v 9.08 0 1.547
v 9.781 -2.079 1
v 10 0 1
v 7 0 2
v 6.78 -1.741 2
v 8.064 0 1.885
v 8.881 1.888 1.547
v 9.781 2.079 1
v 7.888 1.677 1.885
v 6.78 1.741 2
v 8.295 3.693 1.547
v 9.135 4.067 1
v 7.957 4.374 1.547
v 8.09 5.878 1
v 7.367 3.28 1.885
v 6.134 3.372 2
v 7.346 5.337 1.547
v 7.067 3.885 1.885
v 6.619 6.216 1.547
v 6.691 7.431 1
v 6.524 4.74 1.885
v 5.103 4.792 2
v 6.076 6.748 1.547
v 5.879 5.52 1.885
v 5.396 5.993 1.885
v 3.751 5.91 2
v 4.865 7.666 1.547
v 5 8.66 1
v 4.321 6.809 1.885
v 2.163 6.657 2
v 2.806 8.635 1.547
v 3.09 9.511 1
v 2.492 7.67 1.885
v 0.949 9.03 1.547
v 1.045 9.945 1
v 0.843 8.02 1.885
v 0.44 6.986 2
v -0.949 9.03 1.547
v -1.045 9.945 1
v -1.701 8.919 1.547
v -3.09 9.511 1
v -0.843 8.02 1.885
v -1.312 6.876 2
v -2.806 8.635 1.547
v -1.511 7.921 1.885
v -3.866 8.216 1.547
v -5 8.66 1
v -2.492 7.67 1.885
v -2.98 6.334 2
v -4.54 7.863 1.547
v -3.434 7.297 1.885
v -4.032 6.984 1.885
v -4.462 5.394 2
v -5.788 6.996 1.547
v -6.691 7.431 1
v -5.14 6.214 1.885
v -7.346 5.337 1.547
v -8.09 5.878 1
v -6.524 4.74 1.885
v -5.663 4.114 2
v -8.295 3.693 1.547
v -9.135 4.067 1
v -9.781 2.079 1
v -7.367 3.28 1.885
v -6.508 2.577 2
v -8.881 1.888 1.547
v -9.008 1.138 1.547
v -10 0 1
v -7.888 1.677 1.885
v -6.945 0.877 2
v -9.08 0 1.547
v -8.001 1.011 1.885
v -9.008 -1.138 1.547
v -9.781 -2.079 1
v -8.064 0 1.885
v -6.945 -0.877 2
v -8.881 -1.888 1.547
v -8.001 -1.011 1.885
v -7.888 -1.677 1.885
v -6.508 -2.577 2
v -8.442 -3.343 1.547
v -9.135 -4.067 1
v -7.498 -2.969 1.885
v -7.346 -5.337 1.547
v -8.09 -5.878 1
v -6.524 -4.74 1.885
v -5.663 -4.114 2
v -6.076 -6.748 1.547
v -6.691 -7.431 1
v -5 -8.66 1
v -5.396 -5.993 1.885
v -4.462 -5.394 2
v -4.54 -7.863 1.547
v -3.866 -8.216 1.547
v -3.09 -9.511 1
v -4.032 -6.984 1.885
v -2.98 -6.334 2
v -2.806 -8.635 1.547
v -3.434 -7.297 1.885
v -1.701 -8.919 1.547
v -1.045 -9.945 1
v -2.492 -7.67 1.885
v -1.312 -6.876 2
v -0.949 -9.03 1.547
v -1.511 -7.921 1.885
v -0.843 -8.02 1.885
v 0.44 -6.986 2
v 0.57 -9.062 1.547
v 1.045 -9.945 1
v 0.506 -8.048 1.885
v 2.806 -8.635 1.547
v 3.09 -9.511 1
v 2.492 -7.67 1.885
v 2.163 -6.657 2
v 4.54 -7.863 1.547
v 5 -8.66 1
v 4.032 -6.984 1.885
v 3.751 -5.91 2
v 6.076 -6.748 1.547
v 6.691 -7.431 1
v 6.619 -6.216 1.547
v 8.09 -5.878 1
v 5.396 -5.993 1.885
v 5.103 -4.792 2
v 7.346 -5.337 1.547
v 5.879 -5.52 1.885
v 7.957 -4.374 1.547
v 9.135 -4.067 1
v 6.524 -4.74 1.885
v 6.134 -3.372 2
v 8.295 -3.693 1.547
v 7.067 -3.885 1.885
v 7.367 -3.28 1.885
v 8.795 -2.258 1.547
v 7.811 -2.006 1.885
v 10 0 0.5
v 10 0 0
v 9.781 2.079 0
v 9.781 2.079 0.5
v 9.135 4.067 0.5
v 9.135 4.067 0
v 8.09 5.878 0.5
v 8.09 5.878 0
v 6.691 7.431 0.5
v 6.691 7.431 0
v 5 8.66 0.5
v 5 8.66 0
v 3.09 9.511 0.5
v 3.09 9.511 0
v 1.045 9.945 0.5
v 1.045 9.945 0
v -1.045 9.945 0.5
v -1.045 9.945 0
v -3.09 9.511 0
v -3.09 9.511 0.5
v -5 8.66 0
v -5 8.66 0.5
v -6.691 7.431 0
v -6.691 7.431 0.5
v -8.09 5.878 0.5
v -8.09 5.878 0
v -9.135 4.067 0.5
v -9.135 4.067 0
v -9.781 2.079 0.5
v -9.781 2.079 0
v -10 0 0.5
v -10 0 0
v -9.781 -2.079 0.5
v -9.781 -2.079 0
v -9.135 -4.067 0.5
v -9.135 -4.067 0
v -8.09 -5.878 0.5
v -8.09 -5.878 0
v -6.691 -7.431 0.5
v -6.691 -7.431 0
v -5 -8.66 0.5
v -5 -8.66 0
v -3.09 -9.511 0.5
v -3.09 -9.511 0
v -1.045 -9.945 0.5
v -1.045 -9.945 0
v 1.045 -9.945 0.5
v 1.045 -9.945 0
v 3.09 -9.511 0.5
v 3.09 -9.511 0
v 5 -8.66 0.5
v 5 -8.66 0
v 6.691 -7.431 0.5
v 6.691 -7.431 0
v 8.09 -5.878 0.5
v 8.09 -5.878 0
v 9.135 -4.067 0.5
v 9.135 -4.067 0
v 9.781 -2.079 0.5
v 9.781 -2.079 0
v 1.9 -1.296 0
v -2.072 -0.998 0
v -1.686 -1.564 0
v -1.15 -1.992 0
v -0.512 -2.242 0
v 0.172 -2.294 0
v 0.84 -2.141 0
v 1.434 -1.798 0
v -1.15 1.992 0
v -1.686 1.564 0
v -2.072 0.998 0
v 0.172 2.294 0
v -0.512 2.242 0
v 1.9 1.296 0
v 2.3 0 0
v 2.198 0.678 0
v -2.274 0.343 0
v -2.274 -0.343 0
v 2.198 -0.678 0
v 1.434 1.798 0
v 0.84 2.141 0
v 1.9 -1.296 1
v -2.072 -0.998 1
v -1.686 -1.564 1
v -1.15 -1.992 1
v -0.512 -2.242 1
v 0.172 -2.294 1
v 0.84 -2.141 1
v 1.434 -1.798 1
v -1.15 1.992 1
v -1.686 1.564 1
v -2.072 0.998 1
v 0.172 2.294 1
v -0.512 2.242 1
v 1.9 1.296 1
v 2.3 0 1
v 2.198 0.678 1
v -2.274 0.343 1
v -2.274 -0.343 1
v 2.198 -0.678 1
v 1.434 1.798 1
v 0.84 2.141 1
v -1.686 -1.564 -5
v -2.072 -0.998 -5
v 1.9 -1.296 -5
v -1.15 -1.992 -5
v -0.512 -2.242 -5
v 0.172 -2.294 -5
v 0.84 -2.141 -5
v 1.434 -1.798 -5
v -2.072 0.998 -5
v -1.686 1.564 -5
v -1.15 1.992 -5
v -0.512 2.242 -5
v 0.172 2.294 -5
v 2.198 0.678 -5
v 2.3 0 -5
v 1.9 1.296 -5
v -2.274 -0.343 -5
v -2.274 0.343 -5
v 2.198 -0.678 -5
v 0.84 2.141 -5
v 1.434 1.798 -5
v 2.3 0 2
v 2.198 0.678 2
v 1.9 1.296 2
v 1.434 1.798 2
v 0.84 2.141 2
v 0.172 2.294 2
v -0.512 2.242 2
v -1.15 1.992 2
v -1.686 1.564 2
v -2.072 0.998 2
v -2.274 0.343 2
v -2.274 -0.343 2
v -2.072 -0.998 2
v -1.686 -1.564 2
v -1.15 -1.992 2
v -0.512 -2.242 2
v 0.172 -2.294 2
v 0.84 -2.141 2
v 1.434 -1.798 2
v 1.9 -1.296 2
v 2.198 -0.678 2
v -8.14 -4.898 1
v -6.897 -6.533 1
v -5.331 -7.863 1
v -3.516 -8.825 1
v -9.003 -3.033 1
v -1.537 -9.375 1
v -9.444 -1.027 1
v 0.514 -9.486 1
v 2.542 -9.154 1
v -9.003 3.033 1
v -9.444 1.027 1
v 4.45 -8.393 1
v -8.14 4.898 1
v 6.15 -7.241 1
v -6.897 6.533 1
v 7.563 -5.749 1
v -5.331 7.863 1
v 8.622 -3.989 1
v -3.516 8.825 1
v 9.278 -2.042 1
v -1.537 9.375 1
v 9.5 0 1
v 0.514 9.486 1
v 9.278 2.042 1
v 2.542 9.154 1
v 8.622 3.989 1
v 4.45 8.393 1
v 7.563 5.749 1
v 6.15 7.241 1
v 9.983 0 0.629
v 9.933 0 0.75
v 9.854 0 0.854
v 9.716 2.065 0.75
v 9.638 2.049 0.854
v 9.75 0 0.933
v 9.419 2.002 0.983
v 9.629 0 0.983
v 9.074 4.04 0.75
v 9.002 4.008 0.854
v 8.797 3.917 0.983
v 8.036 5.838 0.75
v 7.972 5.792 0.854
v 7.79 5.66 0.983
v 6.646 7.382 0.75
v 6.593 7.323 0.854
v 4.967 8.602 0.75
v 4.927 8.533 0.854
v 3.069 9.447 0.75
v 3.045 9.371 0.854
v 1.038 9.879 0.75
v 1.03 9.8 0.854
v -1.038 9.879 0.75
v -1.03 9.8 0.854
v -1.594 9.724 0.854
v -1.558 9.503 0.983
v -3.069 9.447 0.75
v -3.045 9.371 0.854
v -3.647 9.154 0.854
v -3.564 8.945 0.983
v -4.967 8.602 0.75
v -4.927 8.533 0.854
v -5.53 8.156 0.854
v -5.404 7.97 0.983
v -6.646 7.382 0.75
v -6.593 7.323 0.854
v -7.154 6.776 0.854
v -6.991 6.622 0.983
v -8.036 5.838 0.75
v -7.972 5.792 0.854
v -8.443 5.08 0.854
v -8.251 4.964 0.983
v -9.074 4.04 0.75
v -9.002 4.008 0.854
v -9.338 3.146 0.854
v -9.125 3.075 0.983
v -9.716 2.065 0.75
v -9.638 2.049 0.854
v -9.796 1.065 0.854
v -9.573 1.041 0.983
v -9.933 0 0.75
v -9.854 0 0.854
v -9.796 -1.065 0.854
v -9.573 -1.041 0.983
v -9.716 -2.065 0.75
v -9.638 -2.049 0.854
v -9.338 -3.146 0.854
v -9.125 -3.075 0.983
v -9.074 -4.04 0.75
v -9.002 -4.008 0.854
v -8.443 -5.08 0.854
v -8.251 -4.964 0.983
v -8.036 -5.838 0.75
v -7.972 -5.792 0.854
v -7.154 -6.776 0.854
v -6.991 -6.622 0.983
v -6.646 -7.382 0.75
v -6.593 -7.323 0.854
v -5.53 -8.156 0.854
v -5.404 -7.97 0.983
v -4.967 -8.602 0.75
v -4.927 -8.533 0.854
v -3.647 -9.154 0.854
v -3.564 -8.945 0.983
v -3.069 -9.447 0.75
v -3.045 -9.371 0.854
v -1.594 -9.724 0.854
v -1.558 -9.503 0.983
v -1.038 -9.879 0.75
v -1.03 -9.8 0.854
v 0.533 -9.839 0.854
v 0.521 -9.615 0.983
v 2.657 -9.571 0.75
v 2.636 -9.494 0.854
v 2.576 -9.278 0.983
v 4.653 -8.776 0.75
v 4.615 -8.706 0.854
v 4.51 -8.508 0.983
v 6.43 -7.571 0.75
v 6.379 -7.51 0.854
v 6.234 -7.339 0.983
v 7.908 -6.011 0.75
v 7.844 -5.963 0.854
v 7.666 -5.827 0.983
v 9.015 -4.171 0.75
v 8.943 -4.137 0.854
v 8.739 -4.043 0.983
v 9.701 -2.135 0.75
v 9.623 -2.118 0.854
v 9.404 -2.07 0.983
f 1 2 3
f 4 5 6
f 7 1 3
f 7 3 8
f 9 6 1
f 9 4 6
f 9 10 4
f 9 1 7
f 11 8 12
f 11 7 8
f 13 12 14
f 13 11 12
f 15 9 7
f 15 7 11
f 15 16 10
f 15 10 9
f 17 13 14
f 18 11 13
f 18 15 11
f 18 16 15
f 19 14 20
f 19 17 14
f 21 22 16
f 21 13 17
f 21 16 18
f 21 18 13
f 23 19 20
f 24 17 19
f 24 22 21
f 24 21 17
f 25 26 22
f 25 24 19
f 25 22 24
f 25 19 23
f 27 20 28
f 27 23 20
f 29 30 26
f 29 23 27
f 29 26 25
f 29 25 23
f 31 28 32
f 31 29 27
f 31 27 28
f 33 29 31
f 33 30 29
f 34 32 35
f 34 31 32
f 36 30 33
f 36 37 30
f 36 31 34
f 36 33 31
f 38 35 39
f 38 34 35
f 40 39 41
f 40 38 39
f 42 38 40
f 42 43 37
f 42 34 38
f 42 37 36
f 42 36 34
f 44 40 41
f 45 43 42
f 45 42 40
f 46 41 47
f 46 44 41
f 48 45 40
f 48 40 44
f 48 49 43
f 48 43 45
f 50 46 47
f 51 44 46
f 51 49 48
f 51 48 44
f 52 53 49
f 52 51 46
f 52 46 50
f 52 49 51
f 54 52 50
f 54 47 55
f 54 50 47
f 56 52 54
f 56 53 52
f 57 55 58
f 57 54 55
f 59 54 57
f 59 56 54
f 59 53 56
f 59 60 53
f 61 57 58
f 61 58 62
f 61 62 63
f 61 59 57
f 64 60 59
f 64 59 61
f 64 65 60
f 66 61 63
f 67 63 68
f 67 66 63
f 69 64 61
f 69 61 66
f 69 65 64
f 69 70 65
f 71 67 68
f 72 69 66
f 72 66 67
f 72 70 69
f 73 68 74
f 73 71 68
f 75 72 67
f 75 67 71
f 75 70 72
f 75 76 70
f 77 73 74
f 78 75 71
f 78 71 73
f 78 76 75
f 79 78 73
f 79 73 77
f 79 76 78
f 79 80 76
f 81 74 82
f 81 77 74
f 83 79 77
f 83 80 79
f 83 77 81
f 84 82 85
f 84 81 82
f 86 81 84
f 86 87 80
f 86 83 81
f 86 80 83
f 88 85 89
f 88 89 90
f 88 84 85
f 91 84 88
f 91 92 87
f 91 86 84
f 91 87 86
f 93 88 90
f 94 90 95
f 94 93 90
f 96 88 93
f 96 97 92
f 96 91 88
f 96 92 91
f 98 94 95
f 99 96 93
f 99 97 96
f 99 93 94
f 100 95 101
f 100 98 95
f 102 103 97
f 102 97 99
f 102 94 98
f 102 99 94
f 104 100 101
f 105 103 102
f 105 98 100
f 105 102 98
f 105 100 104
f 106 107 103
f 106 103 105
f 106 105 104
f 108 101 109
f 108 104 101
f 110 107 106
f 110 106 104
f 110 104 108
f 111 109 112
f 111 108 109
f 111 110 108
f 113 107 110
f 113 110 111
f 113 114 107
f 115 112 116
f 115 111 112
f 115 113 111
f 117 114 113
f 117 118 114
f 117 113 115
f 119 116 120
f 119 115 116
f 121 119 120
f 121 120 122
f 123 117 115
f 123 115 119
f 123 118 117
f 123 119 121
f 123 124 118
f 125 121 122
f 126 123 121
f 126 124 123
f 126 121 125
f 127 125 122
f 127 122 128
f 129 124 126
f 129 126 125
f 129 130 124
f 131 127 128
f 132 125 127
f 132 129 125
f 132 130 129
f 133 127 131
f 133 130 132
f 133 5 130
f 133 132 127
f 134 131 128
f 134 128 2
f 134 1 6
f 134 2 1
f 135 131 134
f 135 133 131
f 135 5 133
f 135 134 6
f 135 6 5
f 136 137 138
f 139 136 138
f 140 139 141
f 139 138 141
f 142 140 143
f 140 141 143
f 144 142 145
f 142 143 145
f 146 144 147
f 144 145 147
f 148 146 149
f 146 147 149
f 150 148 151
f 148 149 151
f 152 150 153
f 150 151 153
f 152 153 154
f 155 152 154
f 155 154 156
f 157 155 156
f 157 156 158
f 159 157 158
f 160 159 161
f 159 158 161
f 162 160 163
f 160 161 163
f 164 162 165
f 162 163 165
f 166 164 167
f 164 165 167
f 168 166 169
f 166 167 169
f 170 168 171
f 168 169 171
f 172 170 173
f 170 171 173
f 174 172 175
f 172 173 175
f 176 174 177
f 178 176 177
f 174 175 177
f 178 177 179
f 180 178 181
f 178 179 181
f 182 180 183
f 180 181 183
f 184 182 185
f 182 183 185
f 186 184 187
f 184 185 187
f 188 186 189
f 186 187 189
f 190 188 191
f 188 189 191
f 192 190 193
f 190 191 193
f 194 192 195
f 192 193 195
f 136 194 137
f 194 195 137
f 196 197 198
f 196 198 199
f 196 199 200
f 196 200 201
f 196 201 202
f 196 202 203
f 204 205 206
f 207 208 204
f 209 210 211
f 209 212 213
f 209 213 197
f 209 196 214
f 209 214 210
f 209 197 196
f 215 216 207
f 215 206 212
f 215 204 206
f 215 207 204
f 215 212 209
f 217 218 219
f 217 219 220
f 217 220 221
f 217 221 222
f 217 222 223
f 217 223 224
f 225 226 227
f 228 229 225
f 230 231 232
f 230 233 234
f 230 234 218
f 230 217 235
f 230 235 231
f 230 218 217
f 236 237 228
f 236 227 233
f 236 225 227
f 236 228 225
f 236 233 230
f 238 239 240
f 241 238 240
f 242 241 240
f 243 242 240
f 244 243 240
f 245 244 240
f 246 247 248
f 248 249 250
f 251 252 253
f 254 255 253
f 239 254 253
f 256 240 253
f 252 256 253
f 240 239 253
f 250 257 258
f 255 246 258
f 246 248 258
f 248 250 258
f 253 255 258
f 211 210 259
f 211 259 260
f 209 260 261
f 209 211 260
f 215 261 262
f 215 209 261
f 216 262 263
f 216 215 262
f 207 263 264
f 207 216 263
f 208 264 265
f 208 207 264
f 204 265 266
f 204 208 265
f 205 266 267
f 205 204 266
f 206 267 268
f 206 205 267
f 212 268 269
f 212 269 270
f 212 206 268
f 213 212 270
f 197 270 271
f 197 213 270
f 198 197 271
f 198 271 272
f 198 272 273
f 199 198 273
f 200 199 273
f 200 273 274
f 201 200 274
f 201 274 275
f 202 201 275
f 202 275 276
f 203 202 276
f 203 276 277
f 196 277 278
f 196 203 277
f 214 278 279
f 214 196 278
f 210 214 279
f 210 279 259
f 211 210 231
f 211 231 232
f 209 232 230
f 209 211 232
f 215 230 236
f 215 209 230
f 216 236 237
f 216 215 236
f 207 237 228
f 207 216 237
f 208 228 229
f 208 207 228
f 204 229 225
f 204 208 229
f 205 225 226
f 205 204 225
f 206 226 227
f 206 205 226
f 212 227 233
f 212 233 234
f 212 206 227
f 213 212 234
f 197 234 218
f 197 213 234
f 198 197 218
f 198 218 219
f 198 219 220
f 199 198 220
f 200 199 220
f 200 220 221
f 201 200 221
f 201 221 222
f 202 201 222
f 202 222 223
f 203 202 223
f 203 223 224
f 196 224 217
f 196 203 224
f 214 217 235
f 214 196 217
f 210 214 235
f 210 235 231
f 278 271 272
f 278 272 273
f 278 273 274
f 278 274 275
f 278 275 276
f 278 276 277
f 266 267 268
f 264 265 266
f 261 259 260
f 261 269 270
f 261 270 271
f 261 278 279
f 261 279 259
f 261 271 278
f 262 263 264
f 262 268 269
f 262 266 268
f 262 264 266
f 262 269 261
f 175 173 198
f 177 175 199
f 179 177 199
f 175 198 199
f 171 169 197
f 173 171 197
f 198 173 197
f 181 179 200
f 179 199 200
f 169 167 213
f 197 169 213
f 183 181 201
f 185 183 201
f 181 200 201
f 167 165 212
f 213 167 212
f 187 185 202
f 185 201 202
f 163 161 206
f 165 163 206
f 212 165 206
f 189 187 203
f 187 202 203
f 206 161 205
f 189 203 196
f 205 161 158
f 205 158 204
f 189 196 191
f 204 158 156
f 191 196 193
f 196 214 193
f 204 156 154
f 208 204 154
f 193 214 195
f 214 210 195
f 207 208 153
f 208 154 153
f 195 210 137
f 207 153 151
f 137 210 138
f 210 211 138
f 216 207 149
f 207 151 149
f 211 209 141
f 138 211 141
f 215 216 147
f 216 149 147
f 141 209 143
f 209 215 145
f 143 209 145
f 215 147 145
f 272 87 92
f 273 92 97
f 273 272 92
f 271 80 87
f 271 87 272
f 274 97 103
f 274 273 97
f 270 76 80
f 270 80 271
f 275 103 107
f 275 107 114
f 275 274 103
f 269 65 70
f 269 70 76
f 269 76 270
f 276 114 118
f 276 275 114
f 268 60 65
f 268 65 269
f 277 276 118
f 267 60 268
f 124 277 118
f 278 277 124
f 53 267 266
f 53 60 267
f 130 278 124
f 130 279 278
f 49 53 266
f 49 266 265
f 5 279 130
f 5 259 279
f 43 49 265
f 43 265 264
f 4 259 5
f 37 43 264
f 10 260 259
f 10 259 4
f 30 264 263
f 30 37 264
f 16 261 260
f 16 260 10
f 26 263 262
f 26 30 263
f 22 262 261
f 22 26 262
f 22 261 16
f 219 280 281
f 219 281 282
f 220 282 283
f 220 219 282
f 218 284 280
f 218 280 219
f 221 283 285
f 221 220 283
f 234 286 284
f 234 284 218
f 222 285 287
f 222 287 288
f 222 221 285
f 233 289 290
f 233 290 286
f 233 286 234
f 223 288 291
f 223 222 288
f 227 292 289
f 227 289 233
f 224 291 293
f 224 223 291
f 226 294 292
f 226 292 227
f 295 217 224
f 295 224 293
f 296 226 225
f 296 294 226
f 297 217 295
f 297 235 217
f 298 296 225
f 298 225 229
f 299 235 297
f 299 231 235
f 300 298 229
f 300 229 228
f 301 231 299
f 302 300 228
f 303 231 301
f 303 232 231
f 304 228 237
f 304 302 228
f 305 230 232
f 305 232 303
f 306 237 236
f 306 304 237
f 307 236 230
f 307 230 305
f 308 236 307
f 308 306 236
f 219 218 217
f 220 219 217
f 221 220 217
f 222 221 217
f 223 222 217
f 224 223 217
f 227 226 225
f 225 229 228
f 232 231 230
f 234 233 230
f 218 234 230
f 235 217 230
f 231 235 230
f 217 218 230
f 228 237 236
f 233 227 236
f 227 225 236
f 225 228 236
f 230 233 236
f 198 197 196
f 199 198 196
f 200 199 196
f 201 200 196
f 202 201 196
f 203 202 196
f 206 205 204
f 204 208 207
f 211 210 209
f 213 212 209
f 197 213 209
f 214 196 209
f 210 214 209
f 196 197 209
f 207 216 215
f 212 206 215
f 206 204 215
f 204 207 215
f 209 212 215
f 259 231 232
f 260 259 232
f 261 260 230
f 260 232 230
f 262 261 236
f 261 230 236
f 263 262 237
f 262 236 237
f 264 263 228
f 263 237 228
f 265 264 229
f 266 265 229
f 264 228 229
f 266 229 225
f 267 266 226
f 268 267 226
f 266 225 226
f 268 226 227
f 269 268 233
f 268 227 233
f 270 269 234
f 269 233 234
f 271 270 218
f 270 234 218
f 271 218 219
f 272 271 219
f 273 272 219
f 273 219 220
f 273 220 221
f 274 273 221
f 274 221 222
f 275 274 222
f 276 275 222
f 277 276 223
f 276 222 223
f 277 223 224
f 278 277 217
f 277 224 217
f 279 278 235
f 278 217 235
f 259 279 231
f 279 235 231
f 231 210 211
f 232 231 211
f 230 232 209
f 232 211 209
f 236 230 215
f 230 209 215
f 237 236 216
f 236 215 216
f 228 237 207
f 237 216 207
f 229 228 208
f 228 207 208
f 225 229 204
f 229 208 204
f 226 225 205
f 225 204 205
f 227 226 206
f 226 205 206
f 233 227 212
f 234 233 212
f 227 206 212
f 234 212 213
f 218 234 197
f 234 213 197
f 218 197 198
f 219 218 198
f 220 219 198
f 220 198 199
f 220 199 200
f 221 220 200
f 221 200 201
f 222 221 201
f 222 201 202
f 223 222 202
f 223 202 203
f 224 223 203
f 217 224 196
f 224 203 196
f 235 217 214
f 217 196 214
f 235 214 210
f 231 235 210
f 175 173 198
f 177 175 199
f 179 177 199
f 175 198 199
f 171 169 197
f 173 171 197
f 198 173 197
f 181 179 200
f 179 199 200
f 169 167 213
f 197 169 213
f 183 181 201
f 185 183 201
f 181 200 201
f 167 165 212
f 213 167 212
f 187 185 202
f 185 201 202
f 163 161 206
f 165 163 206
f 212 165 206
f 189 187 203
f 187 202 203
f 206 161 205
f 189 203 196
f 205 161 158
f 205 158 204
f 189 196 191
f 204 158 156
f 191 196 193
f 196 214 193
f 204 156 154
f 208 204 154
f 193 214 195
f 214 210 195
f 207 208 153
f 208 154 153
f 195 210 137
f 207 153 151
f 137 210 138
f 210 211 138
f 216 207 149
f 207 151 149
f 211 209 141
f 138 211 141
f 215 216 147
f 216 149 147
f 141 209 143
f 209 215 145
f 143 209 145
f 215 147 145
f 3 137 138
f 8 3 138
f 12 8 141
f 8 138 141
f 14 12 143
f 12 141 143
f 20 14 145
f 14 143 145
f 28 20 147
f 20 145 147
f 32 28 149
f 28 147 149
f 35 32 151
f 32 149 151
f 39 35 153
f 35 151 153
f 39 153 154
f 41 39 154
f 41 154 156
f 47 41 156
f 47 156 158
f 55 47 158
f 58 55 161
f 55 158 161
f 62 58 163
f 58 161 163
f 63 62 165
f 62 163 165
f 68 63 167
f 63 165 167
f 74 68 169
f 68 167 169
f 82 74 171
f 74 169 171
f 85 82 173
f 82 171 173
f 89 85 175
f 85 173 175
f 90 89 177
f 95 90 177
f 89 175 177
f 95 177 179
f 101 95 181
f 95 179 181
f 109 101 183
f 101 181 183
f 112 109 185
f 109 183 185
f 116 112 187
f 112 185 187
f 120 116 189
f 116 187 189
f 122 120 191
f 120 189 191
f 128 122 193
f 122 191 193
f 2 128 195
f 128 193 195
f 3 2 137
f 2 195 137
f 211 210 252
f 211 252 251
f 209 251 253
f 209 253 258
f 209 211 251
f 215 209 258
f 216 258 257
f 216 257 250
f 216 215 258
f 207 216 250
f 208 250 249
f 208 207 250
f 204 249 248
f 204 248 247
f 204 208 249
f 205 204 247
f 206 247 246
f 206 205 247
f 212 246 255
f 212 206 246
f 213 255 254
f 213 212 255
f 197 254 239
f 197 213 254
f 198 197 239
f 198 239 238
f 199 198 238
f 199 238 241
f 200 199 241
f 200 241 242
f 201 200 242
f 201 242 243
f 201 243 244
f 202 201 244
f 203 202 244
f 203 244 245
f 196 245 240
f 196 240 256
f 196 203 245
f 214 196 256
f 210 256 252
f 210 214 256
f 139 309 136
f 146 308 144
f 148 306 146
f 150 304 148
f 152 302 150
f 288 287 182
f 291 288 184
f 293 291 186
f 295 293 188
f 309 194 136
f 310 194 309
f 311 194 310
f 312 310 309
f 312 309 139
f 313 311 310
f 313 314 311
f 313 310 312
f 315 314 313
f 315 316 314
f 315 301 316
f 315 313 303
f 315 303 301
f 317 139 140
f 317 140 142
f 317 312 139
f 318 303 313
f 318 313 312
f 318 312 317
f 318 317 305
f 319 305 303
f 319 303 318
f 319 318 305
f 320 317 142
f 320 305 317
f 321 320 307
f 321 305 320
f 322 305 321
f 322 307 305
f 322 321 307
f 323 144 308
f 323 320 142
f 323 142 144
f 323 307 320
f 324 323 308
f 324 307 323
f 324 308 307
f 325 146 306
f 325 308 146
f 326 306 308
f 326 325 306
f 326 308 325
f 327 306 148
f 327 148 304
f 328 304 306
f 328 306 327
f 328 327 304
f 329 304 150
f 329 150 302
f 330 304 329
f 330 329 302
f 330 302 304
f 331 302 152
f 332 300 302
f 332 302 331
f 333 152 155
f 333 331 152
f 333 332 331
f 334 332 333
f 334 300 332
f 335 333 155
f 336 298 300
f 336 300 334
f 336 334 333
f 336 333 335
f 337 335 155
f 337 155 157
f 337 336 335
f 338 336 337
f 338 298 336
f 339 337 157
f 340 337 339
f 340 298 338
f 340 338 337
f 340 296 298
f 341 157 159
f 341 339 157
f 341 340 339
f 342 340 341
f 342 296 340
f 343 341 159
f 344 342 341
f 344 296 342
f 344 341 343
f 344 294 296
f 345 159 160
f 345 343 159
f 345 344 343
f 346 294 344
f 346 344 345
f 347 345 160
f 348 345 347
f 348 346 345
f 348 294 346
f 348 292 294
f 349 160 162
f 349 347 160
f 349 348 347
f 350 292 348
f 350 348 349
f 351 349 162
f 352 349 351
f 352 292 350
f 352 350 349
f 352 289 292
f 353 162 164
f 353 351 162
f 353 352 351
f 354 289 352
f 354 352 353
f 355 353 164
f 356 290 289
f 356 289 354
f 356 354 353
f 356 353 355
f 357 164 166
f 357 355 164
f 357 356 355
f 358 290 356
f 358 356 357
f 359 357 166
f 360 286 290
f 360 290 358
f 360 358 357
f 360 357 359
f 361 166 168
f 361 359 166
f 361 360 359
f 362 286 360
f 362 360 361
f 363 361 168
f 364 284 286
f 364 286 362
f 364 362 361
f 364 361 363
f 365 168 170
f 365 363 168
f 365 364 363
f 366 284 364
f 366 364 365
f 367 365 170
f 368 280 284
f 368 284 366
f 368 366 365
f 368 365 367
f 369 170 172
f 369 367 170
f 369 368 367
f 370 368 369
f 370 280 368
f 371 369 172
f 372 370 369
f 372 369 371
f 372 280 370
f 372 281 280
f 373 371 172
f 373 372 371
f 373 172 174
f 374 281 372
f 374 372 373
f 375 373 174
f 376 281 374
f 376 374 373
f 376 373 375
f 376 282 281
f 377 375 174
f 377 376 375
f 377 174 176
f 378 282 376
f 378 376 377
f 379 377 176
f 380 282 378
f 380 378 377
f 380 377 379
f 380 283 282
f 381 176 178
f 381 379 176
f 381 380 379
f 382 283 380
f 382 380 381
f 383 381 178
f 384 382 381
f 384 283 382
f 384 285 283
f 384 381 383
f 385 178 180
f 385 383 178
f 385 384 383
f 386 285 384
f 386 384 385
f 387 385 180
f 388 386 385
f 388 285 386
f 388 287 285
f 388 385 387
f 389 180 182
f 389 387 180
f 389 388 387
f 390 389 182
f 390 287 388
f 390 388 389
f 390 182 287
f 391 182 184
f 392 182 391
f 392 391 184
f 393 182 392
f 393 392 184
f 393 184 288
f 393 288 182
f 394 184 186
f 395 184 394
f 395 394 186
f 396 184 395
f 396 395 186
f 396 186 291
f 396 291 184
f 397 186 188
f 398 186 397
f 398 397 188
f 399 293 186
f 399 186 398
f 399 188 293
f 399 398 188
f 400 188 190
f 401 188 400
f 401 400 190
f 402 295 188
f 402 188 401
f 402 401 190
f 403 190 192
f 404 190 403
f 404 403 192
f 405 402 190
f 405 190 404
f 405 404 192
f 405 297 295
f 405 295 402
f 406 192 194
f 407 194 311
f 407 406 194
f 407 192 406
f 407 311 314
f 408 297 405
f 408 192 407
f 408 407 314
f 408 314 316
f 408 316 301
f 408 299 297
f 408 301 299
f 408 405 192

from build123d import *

# Parameters (mm, degrees)
F0_R     = 10
F0_R_2   = 2.3
F1_DEPTH = 1
F2_R     = 0.5
F3_DEPTH = 5
F4_DEPTH = 1
F5_DEPTH = 2
F6_DEPTH = 1
F7_SIZE  = 1


# Not quite as in the source:
# - a fillet or chamfer that OpenCascade refuses, or shapes differently, is made with other operations: its cross-section is extruded or revolved along the edge and cut away or added


with BuildPart() as f1:
    # F0 (on Top) → F1 (new body)
    with BuildSketch(Plane.XY):
        Circle(F0_R)
        Circle(F0_R_2, mode=Mode.SUBTRACT)
    extrude(amount=F1_DEPTH)

    # F2
    f2_edges = [f1.edges().sort_by_distance(p)[0] for p in [
        (-10, 0, 1),
    ]]
    fillet(f2_edges, radius=F2_R)

    # F0 (on Top) → F3 (join)
    with BuildSketch(Plane.XY):
        Circle(F0_R_2)
    extrude(amount=-F3_DEPTH)


with BuildPart() as f4:
    # F4 (new): a face of the model
    f4_faces = [f1.part.faces().sort_by_distance(p)[0] for p in [
        (0, 0, 0),
    ]]
    extrude(f4_faces, amount=F4_DEPTH)


with BuildPart() as f5:
    # F5 (new): a face of the model
    f5_faces = [f1.part.faces().sort_by_distance(p)[0] for p in [
        (-9.7171572875, 0, 0),
    ]]
    extrude(f5_faces, amount=-F5_DEPTH)

    # F7
    f7_edges = [f5.edges().sort_by_distance(p)[0] for p in [
        (-10, 0, 2),
    ]]
    chamfer(f7_edges, length=F7_SIZE)

    # F8: fillet of radius 5 on 1 edges, made by hand

    # F8_s1 → F8_t2 (revolve, cut)
    with BuildSketch(Plane.XZ):
        with BuildLine():
            ThreePointArc((10, 1), (8.5811388301, 1.7434164903), (7, 2))
            Line((7, 2), (9, 2))
            Line((9, 2), (10, 1))
        make_face()
    revolve(axis=Axis((0, 0, 2), (0, 0, 1)), mode=Mode.SUBTRACT)


with BuildPart() as f6:
    # F6 (new): a face of the model
    f6_faces = [f4.part.faces().sort_by_distance(p)[0] for p in [
        (0, 0, 1),
    ]]
    extrude(f6_faces, amount=F6_DEPTH)


solid = Compound([f1.part, f4.part, f5.part, f6.part])
